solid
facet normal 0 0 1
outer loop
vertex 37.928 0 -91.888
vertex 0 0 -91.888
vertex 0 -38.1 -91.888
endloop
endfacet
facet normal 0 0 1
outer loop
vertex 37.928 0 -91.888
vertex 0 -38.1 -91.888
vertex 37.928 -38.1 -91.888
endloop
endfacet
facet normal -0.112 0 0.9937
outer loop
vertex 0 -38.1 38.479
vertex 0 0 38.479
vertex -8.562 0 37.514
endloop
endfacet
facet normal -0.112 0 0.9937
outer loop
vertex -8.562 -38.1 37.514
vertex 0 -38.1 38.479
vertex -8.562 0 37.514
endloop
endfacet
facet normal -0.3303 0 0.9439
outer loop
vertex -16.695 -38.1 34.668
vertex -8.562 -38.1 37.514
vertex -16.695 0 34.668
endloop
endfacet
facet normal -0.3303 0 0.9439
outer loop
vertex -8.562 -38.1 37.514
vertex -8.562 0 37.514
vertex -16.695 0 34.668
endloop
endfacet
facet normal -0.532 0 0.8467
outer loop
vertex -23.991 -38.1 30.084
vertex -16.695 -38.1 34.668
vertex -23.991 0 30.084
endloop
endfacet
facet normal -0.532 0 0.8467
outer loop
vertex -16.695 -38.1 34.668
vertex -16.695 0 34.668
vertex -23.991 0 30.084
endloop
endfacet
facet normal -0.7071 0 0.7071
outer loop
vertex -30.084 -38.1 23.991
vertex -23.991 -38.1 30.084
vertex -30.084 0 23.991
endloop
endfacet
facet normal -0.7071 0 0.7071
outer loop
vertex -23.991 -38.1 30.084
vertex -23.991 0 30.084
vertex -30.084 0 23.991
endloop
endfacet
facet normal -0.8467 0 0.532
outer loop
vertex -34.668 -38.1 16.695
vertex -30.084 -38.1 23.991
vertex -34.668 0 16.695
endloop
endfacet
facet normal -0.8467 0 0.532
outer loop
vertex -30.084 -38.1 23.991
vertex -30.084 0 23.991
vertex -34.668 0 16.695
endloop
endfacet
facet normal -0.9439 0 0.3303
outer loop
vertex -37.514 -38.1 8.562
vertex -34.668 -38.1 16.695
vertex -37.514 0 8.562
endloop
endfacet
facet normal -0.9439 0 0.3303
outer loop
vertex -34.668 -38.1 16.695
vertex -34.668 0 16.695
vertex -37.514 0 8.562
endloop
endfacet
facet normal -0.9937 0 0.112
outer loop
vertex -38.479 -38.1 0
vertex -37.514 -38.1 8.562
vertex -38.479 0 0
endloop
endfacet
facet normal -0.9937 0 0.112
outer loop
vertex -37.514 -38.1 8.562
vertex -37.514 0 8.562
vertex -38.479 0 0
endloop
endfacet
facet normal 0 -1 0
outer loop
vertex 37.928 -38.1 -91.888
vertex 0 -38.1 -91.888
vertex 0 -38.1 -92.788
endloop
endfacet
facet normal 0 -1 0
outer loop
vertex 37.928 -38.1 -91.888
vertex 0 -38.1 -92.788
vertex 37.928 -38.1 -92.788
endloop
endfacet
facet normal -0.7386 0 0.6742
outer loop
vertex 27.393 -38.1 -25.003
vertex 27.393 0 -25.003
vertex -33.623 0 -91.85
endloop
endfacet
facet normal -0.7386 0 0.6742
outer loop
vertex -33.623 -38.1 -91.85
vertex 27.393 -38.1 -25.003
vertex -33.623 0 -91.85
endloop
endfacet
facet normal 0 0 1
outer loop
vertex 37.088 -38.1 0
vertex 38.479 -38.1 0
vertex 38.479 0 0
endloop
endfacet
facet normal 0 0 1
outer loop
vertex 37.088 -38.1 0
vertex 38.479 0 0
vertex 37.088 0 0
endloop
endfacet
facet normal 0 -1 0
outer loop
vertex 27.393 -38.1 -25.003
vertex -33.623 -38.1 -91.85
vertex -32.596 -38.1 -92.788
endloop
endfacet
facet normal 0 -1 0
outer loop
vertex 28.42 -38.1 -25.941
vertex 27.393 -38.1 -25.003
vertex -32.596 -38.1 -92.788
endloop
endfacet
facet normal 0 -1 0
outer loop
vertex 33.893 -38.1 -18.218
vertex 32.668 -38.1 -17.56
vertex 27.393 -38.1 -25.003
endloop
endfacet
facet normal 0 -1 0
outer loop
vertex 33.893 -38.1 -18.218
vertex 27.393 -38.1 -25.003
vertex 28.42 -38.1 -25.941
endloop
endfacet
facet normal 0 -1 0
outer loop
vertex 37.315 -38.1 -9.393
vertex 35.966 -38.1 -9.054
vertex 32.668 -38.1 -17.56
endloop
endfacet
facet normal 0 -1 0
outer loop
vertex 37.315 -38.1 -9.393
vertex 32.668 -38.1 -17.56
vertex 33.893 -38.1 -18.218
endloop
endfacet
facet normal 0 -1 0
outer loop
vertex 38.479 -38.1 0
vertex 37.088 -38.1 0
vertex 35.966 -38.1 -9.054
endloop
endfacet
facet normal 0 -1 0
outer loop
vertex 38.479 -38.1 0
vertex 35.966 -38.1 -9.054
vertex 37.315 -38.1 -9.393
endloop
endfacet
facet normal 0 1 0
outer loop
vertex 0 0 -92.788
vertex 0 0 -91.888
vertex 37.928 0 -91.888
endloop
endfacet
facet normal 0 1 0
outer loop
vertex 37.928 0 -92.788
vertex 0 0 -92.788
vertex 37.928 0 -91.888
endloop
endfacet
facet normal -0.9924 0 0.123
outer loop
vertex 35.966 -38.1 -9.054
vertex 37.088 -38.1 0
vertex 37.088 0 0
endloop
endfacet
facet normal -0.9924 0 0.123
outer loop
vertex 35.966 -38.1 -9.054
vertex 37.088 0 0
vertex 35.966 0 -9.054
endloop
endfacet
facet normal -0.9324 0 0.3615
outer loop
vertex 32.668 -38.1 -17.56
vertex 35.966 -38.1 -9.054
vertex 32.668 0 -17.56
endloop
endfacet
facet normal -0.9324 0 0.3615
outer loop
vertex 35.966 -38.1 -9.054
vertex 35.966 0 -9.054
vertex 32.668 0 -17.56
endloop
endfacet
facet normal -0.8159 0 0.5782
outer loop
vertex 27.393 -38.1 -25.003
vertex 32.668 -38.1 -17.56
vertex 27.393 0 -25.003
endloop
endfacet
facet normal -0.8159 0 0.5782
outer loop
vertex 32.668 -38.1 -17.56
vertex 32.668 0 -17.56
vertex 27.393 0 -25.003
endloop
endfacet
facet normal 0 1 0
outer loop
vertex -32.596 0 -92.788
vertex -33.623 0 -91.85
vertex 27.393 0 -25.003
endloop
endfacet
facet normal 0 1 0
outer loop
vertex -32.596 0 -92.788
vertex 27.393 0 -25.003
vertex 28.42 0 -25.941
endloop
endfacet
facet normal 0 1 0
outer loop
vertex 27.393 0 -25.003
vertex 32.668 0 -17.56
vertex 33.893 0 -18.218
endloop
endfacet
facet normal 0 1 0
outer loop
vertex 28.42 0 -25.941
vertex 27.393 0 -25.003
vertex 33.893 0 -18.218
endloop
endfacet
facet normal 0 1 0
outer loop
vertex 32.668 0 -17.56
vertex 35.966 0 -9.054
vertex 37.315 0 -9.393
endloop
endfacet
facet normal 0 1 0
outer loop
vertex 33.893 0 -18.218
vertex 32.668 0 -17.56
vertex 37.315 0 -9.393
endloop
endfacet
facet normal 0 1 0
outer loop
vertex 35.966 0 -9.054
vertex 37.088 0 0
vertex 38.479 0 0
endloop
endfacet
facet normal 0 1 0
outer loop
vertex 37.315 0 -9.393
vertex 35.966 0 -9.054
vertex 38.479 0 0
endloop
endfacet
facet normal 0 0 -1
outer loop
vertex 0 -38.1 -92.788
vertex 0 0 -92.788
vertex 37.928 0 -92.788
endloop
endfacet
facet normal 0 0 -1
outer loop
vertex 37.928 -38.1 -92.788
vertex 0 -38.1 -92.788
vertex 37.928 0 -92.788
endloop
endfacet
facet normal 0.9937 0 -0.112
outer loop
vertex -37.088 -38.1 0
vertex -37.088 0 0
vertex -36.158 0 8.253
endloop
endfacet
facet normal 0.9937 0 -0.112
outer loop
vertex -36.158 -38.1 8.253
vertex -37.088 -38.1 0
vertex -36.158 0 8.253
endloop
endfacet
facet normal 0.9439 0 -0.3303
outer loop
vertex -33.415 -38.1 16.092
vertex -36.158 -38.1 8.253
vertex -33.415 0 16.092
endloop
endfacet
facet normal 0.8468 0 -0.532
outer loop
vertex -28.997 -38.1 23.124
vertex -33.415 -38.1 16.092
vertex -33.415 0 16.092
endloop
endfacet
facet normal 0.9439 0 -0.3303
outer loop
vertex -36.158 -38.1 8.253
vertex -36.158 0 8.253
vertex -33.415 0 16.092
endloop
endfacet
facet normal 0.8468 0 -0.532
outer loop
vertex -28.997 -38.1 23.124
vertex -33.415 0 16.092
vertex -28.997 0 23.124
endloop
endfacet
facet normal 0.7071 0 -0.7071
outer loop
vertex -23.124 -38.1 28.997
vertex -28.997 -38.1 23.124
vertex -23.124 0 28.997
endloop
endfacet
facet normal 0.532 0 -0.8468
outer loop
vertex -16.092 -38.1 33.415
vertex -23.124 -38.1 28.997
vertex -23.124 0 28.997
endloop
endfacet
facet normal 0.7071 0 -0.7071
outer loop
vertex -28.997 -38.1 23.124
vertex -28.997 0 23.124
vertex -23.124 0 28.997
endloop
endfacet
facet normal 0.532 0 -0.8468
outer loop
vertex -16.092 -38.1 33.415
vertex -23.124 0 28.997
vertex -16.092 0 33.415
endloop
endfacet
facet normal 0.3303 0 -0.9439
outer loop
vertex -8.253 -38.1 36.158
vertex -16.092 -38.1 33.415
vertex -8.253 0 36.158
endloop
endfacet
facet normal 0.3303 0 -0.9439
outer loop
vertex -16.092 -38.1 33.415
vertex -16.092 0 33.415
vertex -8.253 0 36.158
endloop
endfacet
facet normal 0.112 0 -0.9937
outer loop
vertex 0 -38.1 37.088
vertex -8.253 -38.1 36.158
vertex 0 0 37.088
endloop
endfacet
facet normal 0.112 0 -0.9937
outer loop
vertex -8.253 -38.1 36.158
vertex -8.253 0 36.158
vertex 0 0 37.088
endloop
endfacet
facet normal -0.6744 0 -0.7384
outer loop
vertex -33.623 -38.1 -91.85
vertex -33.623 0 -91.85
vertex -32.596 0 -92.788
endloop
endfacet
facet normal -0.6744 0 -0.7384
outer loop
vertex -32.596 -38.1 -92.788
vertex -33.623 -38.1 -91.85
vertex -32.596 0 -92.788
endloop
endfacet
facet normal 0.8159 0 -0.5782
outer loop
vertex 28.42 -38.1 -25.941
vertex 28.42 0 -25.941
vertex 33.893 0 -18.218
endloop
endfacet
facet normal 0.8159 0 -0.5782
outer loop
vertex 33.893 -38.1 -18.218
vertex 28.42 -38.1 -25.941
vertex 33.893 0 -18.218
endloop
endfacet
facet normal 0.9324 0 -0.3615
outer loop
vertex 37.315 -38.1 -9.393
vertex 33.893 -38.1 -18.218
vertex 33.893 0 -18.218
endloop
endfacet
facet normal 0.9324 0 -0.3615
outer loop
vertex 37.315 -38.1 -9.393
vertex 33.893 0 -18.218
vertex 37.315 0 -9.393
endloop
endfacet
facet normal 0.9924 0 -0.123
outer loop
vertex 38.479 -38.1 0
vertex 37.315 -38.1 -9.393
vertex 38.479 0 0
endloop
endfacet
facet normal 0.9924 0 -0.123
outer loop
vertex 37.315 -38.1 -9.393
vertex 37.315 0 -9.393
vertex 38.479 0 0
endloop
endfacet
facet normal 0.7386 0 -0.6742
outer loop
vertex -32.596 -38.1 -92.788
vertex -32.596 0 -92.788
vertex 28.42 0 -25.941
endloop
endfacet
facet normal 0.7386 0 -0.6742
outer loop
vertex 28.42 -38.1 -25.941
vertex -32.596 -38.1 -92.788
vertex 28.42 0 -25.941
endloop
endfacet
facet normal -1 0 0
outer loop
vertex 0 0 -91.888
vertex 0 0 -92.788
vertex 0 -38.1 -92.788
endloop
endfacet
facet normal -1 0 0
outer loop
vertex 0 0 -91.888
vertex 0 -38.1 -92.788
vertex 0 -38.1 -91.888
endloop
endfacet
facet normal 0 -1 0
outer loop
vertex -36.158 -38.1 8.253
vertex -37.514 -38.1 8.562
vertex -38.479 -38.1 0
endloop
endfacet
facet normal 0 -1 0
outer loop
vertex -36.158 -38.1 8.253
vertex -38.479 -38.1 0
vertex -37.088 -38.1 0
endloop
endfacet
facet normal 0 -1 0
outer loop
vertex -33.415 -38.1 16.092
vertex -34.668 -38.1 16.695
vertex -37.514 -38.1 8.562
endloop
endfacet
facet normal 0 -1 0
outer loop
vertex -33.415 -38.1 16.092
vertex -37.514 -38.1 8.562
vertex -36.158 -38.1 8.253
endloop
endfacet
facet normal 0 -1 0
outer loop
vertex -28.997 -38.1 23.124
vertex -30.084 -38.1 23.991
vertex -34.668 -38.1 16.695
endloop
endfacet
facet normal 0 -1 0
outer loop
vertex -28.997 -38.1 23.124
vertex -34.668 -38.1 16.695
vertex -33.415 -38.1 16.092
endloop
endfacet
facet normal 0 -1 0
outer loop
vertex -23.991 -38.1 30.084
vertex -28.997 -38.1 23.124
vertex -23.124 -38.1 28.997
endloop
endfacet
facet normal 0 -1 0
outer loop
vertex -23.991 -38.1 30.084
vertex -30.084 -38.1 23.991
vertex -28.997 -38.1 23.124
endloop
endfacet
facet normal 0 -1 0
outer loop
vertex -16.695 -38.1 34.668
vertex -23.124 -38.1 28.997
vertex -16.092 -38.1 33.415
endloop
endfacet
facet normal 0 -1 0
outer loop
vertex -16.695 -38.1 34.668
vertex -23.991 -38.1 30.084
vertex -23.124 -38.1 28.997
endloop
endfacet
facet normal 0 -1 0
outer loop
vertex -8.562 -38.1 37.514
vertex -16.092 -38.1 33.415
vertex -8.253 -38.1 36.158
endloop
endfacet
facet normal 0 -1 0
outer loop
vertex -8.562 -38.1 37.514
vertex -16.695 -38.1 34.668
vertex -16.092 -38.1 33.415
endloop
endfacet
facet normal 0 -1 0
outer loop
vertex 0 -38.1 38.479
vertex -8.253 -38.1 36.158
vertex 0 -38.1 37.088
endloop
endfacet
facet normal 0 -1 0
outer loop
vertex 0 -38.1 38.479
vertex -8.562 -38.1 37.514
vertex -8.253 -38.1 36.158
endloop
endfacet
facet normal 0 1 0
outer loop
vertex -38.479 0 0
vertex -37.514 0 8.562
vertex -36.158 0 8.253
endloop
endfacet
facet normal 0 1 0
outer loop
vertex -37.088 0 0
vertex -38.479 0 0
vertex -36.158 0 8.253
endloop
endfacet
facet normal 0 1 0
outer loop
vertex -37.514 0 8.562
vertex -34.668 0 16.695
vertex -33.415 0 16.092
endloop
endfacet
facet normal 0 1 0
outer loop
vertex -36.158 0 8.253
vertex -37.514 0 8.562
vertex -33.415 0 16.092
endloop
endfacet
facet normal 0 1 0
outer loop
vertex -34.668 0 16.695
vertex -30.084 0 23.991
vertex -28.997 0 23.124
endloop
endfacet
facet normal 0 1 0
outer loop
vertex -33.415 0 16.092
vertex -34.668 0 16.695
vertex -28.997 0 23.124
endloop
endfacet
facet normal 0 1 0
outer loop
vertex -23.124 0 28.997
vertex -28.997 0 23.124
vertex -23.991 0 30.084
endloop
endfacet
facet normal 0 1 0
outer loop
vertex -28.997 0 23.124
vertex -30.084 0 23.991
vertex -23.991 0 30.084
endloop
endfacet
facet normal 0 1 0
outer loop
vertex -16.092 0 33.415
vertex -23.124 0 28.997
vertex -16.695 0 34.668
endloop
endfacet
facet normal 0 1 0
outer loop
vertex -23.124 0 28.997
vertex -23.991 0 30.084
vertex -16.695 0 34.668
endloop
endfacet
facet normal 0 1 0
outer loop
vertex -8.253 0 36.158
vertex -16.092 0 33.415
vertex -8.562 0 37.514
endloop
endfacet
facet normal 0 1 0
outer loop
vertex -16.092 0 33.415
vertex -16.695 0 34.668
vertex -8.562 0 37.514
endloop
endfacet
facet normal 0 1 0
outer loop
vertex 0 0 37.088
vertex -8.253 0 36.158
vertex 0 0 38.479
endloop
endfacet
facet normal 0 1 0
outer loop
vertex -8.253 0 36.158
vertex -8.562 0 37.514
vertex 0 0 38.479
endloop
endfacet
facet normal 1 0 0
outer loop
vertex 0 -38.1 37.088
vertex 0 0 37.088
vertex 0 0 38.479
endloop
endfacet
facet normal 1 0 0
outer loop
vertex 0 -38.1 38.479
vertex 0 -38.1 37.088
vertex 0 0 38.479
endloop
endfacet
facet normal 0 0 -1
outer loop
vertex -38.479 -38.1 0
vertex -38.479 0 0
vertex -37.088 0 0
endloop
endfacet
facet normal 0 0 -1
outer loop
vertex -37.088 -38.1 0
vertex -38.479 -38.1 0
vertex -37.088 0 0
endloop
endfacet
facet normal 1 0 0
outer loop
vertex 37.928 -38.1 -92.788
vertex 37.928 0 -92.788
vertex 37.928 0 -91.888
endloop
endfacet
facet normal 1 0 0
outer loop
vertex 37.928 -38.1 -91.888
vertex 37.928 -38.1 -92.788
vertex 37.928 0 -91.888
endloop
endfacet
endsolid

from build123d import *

# Parameters (mm, degrees)
F0_W     = 37.927904
F0_H     = 0.899671
F1_DEPTH = 38.1


with BuildPart() as f1:
    # F0 (on Front) → F1 (new body)
    with BuildSketch(Plane.XZ):
        with BuildLine():
            Line((-32.595715, -92.787935), (28.419951, -25.940655))
            ThreePointArc((28.419951, -25.940655), (35.875997, -13.911293), (38.478711, 0))
            Line((38.478711, 0), (37.088079, 0))
            ThreePointArc((37.088079, 0), (34.579428, -13.408534), (27.392846, -25.003152))
            Line((27.392846, -25.003152), (-33.622821, -91.850433))
            Line((-33.622821, -91.850433), (-32.595715, -92.787935))
        make_face()
        with Locations((18.963952, -92.338099)):
            Rectangle(F0_W, F0_H)
        with BuildLine():
            Line((0, 37.088079), (0, 38.478711))
            ThreePointArc((0, 38.478711), (-27.208558, 27.208558), (-38.478711, 0))
            Line((-38.478711, 0), (-37.088079, 0))
            ThreePointArc((-37.088079, 0), (-26.225232, 26.225232), (0, 37.088079))
        make_face()
    extrude(amount=F1_DEPTH)


solid = f1.part
